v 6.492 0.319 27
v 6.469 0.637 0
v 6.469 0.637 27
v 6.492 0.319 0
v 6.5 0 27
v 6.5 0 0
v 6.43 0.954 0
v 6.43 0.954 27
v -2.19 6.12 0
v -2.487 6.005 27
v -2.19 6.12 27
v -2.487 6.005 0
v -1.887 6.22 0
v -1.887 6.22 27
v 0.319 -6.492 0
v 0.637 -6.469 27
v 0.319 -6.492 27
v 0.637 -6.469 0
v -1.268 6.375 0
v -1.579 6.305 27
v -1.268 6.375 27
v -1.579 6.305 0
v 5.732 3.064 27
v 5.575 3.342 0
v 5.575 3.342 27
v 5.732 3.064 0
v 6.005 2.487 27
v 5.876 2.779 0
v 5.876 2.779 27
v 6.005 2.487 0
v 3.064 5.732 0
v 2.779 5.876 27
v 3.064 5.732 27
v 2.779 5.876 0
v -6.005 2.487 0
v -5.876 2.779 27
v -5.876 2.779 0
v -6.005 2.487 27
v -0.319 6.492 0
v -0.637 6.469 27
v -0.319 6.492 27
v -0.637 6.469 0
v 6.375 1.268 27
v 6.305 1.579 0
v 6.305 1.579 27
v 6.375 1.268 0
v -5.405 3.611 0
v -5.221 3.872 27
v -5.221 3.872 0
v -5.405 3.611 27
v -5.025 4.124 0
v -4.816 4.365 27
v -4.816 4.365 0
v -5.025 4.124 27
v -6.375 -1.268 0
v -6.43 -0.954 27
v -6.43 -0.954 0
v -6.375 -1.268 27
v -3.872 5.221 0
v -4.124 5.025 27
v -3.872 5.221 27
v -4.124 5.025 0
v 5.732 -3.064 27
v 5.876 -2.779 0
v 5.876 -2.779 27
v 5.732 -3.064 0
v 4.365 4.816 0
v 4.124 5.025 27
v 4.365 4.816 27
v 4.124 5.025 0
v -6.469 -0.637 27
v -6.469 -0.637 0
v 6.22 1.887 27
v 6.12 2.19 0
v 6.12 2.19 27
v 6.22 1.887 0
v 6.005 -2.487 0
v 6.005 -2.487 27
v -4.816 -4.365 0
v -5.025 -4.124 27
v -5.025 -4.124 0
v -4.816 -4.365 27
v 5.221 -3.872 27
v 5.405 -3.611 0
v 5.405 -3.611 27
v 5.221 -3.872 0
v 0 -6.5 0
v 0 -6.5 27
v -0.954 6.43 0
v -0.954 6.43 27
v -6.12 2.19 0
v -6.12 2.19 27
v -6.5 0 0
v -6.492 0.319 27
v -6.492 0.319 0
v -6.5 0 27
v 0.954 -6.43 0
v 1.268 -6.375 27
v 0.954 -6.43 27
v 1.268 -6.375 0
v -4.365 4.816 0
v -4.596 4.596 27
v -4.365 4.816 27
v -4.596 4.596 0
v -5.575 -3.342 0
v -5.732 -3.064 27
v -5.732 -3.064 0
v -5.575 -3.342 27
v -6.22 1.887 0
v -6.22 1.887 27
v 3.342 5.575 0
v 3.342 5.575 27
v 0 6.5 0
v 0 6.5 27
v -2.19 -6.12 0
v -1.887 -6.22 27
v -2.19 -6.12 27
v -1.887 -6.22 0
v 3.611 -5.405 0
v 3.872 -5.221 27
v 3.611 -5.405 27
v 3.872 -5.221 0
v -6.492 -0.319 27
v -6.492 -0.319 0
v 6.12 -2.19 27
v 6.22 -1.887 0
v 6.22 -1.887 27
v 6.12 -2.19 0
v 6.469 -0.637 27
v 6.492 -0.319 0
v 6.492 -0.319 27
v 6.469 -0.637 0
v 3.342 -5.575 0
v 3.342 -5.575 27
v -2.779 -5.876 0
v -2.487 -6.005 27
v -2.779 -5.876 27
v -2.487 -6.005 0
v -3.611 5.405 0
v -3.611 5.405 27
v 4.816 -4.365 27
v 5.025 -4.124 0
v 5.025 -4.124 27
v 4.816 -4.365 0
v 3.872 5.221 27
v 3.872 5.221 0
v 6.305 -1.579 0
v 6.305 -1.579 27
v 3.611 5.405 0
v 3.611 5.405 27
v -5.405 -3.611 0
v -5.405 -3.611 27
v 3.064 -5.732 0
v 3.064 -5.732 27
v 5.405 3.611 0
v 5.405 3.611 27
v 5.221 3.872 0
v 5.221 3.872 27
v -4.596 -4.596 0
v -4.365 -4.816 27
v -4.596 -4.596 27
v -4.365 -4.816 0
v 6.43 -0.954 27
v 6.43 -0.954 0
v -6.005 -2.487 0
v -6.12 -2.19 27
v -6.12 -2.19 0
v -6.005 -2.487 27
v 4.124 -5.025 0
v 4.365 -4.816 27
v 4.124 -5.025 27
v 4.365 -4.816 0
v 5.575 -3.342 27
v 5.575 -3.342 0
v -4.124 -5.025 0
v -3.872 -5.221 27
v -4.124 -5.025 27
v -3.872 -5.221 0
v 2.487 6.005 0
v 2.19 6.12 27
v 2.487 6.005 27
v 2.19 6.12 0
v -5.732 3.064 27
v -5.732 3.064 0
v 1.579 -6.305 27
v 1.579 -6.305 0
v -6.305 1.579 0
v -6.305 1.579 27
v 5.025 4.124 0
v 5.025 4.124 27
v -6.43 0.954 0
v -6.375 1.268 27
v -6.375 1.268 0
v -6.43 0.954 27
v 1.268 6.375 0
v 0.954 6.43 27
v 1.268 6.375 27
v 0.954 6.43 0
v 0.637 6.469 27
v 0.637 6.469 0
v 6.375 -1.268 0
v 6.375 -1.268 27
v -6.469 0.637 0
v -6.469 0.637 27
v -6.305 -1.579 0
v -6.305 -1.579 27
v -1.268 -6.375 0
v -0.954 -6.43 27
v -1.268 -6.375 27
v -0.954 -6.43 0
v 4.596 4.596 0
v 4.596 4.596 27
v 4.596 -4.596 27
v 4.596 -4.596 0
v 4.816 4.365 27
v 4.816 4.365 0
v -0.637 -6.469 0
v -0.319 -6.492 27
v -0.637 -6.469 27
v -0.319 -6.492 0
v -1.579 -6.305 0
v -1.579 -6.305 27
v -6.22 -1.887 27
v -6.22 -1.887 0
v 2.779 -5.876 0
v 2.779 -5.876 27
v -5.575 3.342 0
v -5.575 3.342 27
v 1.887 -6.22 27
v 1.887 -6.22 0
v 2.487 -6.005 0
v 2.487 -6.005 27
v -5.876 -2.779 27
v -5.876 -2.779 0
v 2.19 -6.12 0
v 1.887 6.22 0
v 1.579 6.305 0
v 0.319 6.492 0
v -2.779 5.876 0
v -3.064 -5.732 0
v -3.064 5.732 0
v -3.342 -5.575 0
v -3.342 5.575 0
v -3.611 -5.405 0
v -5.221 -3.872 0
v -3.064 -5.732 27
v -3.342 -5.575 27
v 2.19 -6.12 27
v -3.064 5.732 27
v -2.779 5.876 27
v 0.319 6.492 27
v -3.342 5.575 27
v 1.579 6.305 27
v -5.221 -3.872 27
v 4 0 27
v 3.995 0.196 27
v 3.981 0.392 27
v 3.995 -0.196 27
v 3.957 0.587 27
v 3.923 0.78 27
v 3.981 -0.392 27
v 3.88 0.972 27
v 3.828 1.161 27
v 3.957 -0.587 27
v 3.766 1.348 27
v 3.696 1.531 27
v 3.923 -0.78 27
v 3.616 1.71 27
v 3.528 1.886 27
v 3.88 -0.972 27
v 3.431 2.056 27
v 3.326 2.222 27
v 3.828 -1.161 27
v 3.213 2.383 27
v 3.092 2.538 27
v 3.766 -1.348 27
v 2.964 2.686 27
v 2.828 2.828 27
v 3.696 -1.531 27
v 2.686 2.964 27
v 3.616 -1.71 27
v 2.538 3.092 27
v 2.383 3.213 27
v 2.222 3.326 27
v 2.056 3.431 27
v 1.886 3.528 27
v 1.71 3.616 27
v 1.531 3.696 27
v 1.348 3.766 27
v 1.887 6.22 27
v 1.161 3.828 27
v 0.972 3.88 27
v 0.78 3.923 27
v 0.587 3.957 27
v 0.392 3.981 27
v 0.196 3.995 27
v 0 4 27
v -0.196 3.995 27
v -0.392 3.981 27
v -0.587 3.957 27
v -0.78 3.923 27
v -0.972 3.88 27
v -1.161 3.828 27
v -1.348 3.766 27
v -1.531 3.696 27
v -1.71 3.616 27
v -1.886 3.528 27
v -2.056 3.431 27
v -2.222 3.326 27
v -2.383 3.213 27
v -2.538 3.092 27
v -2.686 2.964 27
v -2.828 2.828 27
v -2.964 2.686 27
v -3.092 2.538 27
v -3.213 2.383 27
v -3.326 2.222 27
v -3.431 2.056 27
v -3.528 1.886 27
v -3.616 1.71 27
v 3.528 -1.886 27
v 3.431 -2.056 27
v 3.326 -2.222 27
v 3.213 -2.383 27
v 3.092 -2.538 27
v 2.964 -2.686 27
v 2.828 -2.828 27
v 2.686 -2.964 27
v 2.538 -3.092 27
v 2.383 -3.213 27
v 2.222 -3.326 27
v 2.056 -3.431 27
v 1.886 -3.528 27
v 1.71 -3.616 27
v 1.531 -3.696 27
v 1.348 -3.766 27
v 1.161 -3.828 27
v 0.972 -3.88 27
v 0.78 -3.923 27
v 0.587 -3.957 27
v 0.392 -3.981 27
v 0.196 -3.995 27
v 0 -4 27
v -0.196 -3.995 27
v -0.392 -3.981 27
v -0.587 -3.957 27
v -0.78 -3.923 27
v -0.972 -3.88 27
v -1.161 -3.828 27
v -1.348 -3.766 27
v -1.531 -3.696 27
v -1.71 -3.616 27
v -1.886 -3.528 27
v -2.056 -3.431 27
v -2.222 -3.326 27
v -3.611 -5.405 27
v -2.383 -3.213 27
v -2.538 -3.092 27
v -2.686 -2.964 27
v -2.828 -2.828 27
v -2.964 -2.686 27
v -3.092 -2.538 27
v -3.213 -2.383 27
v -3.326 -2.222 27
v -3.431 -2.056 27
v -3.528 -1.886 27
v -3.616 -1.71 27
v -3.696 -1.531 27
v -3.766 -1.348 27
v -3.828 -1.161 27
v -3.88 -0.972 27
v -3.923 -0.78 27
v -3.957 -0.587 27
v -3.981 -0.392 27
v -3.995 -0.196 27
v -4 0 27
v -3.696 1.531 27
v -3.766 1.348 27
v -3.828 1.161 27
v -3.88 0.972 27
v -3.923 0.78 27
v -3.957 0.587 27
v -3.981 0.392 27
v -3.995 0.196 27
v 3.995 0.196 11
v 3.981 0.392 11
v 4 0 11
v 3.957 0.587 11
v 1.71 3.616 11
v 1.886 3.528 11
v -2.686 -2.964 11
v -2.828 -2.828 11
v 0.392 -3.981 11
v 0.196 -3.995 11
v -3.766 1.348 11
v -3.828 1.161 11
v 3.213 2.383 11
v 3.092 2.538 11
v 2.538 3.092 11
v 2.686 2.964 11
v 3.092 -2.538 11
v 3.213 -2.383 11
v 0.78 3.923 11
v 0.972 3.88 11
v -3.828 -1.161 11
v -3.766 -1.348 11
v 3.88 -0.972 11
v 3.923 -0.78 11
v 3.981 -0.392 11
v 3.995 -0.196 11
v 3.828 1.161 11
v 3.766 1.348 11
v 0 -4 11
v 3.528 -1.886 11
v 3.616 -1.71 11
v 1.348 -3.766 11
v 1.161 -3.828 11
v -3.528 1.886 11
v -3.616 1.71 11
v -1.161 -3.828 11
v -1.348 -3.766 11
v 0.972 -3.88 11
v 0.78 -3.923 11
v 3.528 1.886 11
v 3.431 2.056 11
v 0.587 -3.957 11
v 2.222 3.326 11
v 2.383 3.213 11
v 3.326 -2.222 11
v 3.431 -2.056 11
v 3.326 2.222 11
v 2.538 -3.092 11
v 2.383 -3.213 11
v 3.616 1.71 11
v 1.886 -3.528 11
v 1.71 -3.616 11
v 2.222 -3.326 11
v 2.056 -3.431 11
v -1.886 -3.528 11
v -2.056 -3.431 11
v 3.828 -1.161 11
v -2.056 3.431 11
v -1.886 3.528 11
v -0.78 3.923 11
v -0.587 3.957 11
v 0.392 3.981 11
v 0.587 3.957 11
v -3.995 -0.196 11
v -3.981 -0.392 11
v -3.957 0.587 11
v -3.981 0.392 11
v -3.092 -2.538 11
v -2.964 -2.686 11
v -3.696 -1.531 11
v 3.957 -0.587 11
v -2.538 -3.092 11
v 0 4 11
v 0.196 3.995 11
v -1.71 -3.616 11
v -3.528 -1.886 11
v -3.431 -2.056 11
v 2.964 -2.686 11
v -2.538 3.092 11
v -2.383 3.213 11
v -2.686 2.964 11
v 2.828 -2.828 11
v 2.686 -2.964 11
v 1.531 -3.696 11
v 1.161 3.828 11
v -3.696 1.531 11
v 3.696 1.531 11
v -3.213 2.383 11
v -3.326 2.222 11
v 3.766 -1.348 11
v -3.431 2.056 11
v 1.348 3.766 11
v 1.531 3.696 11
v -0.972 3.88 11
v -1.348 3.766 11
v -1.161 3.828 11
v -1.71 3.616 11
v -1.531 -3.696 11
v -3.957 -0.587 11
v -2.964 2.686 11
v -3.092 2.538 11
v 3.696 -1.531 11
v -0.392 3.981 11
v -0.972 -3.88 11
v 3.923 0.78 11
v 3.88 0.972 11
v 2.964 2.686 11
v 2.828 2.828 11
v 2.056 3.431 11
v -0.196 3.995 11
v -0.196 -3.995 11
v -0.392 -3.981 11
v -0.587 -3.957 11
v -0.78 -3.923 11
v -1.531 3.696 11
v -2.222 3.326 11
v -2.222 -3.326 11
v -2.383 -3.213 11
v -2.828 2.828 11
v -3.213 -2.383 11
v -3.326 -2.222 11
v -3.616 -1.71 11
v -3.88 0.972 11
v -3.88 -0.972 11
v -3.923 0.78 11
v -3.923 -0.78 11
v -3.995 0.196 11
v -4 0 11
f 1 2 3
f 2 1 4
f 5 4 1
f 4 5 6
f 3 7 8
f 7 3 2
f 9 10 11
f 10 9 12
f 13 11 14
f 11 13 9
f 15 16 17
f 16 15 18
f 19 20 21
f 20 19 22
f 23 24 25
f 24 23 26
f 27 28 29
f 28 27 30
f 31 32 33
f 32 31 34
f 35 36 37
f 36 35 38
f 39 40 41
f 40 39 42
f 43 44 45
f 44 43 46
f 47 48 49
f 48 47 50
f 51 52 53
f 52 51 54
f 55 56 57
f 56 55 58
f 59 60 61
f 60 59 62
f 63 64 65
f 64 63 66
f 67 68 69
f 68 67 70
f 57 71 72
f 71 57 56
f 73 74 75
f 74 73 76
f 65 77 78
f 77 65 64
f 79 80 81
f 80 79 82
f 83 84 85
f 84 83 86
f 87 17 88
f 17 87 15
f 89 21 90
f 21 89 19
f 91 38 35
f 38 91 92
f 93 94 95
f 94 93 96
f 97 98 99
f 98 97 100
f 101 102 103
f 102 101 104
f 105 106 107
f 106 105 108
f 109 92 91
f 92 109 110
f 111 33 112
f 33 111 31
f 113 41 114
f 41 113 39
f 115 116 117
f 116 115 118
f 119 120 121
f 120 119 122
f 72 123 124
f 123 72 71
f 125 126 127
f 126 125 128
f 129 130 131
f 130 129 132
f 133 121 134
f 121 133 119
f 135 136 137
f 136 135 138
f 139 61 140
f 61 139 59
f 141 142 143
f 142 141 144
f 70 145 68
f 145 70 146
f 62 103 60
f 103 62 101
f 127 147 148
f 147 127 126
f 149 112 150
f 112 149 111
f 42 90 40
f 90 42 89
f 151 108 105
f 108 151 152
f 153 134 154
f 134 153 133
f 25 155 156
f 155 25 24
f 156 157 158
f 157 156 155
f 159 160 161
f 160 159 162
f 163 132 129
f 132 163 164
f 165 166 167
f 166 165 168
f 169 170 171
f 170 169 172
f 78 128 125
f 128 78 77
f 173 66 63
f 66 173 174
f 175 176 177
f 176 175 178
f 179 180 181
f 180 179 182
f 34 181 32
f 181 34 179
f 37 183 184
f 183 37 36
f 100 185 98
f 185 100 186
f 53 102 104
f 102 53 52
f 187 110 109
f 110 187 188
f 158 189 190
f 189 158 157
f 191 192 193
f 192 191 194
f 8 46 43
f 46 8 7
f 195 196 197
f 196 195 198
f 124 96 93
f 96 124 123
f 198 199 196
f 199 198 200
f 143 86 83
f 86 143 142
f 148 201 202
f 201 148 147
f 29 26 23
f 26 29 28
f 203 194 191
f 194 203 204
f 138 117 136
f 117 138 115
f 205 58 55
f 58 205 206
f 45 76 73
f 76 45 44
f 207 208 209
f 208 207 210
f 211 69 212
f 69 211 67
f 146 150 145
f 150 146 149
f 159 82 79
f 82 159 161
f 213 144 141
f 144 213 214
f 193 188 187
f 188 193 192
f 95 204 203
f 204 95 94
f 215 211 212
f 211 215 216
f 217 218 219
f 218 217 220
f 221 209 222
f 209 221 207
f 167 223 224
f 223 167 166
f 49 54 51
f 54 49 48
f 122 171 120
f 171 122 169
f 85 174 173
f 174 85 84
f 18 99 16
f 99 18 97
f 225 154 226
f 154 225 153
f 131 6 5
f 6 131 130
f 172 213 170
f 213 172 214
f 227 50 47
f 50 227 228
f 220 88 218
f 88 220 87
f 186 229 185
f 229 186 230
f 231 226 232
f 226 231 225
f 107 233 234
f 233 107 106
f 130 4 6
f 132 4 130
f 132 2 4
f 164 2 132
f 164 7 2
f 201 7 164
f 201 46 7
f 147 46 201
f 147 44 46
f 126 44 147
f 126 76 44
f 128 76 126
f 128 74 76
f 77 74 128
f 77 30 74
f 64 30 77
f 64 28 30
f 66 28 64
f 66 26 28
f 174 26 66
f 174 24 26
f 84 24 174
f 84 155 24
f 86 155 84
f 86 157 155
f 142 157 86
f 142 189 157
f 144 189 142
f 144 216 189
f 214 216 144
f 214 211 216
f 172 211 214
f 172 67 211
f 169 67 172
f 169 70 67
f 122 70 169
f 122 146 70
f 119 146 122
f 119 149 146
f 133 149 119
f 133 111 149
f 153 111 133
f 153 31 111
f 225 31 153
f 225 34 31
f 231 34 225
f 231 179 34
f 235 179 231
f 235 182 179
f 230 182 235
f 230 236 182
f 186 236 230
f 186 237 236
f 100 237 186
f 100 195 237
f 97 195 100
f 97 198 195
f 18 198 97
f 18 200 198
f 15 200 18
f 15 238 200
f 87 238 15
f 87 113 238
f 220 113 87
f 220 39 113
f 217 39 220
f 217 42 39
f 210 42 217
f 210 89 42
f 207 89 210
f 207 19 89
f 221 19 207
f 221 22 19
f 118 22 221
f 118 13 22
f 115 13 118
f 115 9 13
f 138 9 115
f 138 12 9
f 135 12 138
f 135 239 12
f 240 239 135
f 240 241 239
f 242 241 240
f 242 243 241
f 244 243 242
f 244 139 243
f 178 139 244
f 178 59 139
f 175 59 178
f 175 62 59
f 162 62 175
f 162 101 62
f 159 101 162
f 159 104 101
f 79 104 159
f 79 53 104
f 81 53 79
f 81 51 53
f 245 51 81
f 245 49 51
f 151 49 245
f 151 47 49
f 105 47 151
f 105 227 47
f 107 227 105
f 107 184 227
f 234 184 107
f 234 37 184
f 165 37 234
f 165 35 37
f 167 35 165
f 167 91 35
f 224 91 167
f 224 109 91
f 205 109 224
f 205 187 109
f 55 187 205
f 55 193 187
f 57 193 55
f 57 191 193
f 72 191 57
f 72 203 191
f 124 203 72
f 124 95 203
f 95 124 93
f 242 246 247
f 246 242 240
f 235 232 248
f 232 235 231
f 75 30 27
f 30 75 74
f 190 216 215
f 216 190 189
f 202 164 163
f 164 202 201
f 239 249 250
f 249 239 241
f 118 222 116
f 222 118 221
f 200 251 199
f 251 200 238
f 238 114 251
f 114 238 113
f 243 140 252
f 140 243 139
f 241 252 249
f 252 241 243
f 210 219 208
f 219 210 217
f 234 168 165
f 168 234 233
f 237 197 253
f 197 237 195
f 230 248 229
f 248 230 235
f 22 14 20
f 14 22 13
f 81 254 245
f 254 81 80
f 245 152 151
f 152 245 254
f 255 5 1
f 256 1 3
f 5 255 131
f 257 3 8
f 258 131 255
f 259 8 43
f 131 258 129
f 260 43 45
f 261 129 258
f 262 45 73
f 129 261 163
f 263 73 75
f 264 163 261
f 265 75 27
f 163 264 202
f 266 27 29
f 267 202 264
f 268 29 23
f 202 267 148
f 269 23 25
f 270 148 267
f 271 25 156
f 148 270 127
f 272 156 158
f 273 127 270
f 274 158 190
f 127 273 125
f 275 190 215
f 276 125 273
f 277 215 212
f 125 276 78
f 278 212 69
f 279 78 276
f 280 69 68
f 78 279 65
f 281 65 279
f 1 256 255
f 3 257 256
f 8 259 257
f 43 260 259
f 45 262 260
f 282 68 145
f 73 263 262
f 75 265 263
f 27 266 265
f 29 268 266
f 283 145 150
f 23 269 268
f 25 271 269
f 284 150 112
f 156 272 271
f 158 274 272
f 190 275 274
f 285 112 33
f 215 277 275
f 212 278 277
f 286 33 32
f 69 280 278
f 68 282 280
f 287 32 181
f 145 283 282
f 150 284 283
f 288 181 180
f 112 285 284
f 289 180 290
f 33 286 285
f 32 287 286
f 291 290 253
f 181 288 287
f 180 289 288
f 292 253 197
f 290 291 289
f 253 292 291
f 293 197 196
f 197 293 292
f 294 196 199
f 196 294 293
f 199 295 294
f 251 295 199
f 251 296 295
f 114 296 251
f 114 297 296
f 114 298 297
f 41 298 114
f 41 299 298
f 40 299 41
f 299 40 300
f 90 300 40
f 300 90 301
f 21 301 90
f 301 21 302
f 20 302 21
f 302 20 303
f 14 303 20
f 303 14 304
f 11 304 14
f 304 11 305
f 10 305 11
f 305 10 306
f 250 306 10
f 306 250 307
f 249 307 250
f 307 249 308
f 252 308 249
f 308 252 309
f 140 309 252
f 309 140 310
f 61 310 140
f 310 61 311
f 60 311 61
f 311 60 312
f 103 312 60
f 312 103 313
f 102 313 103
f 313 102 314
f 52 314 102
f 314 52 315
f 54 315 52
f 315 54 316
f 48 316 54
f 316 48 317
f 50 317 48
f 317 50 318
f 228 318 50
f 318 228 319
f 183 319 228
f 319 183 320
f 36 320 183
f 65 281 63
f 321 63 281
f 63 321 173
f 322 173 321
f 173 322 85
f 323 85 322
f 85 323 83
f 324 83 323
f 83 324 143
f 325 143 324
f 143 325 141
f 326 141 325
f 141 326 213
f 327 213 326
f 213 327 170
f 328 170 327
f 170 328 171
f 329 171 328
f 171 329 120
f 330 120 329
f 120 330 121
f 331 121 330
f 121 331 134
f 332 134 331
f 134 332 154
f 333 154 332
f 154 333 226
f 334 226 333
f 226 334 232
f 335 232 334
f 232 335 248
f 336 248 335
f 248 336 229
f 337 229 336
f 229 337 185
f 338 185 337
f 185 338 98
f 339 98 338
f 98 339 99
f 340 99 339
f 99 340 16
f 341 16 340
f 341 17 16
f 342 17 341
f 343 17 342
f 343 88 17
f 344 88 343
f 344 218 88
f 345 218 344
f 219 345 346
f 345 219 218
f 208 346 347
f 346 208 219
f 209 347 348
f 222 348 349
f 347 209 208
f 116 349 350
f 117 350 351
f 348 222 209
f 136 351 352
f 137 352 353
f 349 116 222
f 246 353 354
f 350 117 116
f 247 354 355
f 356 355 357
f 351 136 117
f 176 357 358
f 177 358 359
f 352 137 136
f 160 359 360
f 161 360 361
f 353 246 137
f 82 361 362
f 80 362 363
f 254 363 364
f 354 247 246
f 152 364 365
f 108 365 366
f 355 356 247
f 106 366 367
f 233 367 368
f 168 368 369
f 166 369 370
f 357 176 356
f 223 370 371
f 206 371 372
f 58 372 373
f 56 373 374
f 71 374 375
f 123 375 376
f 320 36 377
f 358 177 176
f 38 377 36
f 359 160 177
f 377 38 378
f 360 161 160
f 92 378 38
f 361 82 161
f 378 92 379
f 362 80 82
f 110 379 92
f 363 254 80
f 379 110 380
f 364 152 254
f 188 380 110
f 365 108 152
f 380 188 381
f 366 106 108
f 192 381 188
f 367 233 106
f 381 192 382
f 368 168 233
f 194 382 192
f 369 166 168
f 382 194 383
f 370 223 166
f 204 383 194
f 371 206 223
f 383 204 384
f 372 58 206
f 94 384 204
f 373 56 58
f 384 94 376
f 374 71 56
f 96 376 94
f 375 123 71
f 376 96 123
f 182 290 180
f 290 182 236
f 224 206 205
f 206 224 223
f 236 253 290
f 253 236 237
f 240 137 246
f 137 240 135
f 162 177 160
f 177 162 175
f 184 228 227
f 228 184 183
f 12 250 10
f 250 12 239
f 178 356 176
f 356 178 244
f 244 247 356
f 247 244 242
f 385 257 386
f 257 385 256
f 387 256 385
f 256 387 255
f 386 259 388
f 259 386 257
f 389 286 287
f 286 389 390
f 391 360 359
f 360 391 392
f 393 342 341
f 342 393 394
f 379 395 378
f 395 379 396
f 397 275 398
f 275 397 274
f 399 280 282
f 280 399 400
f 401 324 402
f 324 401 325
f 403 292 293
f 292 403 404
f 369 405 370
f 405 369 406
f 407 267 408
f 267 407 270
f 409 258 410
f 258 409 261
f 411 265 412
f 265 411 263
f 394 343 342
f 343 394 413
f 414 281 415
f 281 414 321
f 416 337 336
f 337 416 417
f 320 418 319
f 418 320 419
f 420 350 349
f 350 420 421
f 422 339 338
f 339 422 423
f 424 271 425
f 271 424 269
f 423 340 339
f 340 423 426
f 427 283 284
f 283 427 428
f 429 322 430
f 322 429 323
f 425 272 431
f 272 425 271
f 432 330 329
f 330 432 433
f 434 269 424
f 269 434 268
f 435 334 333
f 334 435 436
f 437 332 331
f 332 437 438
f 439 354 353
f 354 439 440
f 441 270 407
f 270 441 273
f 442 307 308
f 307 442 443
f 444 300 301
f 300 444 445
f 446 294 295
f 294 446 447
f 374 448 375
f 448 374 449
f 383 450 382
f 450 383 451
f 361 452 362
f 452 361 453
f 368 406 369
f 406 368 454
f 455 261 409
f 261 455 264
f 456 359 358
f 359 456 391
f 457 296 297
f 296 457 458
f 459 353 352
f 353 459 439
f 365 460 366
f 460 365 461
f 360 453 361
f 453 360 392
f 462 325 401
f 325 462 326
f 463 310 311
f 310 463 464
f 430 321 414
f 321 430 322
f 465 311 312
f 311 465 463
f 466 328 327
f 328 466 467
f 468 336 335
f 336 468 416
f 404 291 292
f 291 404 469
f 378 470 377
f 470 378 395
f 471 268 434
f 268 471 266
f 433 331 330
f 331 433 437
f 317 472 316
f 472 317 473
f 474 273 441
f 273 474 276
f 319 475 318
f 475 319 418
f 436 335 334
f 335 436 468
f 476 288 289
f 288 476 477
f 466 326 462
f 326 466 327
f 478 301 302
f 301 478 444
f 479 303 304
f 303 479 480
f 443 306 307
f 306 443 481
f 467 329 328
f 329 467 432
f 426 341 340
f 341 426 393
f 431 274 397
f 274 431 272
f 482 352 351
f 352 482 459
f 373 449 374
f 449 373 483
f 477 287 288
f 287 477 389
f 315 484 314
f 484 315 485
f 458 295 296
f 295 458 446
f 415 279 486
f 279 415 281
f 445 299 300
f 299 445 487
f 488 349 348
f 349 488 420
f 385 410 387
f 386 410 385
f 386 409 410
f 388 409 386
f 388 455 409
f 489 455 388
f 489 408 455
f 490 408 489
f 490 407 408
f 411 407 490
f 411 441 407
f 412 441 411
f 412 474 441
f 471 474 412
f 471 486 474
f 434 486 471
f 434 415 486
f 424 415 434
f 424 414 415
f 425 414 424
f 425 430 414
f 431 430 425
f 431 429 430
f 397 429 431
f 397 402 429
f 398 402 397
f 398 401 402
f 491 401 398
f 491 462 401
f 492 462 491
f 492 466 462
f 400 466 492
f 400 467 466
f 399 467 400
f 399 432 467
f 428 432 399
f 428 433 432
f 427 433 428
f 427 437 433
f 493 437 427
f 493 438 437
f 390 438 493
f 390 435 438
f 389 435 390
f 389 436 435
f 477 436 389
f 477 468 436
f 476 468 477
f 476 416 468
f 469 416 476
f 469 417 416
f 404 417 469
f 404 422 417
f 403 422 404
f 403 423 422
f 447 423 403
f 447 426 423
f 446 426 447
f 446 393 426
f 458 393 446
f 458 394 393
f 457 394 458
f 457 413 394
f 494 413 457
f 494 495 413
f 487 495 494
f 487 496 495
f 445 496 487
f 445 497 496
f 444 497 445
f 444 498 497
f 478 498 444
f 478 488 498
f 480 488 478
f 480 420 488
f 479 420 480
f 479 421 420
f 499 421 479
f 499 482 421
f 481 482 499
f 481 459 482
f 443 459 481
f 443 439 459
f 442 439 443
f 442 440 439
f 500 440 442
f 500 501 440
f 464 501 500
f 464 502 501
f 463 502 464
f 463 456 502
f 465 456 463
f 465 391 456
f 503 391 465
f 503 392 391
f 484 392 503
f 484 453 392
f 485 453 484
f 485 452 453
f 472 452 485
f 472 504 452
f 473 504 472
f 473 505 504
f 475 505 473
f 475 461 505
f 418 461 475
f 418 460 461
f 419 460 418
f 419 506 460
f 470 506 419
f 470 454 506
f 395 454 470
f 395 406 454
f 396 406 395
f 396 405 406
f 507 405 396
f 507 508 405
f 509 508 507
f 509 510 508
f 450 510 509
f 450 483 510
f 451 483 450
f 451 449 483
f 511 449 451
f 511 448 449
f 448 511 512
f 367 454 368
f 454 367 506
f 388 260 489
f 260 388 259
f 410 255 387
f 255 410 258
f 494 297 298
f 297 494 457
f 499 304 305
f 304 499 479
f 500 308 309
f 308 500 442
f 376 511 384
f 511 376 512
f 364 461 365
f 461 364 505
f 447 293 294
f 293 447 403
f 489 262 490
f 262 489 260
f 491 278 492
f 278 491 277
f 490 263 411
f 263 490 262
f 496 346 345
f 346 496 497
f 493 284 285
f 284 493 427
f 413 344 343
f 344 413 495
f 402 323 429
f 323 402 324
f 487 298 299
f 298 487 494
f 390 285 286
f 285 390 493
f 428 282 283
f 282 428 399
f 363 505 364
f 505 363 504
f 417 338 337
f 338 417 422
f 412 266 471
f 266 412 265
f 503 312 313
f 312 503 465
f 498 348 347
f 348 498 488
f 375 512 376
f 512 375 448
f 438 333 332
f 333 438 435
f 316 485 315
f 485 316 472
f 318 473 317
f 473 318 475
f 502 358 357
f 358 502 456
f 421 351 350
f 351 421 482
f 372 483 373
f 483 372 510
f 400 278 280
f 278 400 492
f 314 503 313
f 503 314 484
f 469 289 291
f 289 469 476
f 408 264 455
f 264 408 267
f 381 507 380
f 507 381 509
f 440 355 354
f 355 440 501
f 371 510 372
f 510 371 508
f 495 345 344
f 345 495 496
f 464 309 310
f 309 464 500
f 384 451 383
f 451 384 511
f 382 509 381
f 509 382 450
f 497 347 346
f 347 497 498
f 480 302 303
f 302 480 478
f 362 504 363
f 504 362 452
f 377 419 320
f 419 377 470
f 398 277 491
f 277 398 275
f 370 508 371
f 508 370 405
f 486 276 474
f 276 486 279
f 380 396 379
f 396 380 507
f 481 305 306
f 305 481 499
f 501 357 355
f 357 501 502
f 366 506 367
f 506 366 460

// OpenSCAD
// Køben

// Helt ok
$fn=$preview ? 32 : 128;

// Superpetimeter
//$fn=1024;

/*
 * Køtype - sett her
 *
 * standard - vanlig delbar kø laga for limetupp
 * husko    - standard huskø laga for skutupp
 *
 */
kotype = "husko";

// Standardkø
ytre_diameter = 13;
indre_diameter = 8;
indre_diameter_krymp = -0.0;
ytre_hoyde = 27;
indre_hoyde_standard = 22.7;
indre_hoyde_husko = 15;
indre_hoyde_krymp = -1;

// Huskø - endrer verdiene som avviker
indre_hoyde = (kotype == "standard") ? indre_hoyde_standard : indre_hoyde_husko;


difference() {
    cylinder(h=ytre_hoyde, d=ytre_diameter);
    translate([0, 0, ytre_hoyde-(indre_hoyde-indre_hoyde_krymp)]) {
        cylinder(h=indre_hoyde-indre_hoyde_krymp, d=indre_diameter-indre_diameter_krymp);
    }
}
